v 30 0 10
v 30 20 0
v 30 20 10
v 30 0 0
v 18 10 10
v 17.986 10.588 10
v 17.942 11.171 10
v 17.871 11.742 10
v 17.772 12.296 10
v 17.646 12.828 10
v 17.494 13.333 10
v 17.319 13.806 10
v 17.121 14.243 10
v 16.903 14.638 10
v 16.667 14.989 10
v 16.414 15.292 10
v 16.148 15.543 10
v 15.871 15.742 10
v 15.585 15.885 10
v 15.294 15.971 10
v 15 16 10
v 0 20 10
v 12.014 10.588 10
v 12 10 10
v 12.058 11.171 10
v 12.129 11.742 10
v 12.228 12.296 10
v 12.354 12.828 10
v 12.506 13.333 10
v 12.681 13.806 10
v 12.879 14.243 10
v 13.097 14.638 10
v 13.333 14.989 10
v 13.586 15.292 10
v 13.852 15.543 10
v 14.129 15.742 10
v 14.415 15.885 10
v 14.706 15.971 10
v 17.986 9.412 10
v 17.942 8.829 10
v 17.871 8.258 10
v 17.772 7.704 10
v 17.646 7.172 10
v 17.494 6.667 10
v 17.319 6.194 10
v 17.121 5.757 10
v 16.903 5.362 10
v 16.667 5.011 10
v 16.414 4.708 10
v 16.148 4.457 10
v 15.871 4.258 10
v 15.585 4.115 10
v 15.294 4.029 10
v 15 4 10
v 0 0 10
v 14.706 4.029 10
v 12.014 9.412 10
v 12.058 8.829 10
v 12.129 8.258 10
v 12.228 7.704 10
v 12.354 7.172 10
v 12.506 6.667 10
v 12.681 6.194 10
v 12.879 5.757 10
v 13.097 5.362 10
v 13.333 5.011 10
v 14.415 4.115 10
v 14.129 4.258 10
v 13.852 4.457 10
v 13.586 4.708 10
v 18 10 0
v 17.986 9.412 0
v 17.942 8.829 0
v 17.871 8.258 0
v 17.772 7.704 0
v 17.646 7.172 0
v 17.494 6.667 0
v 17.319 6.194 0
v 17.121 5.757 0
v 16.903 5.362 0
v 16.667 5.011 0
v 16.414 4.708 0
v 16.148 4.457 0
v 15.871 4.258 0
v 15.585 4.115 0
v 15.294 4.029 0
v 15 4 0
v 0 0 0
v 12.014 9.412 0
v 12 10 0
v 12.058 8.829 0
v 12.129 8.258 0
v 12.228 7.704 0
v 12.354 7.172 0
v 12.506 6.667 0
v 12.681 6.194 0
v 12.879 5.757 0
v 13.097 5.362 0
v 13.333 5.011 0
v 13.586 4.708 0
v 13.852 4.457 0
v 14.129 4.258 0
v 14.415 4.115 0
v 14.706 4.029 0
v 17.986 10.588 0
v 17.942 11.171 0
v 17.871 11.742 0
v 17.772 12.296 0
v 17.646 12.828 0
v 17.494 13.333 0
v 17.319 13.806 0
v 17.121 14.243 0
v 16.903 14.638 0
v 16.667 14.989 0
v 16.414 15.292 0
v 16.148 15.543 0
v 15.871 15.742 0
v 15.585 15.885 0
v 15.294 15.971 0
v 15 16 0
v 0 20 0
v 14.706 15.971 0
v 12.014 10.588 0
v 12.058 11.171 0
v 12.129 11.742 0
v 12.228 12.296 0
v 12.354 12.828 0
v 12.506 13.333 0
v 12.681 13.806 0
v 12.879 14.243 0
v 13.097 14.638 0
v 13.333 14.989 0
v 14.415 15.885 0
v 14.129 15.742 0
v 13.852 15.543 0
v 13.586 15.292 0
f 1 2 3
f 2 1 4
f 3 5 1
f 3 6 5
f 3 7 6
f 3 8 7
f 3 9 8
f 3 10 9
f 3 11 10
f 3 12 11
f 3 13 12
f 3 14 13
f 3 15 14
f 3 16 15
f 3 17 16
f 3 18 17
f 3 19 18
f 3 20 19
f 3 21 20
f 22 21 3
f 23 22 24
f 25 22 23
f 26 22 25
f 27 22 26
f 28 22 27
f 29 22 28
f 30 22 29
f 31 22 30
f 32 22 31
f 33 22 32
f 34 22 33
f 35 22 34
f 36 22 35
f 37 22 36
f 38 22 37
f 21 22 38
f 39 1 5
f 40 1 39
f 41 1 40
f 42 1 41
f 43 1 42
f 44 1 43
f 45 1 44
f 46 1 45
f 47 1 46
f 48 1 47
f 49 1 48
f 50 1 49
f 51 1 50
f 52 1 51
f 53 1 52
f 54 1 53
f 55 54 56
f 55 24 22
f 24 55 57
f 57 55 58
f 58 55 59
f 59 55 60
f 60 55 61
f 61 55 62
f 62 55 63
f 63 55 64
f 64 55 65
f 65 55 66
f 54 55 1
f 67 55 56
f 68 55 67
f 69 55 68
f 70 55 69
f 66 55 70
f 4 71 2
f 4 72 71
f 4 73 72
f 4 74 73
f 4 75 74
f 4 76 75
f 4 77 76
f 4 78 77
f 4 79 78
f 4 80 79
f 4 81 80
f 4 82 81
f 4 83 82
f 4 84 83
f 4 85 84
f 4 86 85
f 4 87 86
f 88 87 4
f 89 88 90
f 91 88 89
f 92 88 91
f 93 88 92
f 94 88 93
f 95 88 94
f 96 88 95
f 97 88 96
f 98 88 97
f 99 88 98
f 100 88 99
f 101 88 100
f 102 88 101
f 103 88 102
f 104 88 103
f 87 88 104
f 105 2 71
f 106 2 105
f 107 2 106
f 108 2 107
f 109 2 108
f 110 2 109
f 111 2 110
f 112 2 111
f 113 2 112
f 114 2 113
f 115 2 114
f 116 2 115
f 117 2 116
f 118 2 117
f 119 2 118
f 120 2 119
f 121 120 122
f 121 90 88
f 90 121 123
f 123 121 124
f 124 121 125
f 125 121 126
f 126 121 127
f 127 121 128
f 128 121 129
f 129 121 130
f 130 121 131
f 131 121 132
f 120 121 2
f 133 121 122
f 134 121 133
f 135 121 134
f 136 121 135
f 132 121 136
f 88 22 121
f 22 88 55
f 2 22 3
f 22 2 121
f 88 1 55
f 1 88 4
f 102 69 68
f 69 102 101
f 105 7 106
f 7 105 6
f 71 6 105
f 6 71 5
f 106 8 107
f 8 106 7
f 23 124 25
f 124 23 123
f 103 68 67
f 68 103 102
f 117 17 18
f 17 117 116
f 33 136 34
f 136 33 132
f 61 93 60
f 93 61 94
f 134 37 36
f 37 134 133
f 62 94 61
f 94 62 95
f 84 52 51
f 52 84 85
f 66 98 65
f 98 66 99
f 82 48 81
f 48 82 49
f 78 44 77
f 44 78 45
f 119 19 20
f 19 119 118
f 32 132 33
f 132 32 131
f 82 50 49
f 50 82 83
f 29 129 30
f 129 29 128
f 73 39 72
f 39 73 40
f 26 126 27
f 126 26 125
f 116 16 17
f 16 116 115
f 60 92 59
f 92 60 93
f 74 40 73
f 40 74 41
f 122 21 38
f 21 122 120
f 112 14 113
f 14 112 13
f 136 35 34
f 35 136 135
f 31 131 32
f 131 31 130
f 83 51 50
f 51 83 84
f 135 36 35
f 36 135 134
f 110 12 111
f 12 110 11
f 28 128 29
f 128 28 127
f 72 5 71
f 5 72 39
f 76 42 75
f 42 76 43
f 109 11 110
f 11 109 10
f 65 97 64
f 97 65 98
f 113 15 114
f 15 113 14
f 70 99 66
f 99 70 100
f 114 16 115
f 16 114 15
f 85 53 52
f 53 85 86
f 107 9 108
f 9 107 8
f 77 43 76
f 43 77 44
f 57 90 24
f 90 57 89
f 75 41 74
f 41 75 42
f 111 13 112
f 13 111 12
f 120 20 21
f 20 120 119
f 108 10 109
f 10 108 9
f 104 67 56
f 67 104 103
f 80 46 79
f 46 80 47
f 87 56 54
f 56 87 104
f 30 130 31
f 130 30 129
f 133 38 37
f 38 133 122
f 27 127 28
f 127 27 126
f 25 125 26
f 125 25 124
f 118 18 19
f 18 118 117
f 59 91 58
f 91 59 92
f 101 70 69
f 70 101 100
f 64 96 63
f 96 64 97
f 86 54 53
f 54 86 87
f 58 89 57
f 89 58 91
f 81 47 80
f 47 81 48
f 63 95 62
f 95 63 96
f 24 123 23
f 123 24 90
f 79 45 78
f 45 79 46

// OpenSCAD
// Seeded fault for tools/scad2step.py (TV-015): an elliptical hole made by a non-uniform scale of a
// cylinder, outside the restricted dialect of ADR-008. FreeCAD 1.1.3 imports the scale as a
// Matrix_Deformation of BSpline faces and leaves the unscaled cylinder as a second top-level object
// (observed 2026-09-27), so the run stops at check C2 before C5.
difference() {
    cube([30, 20, 10]);
    translate([15, 10, -1]) scale([1, 2, 1]) cylinder(d = 6, h = 12, $fn = 64);
}
